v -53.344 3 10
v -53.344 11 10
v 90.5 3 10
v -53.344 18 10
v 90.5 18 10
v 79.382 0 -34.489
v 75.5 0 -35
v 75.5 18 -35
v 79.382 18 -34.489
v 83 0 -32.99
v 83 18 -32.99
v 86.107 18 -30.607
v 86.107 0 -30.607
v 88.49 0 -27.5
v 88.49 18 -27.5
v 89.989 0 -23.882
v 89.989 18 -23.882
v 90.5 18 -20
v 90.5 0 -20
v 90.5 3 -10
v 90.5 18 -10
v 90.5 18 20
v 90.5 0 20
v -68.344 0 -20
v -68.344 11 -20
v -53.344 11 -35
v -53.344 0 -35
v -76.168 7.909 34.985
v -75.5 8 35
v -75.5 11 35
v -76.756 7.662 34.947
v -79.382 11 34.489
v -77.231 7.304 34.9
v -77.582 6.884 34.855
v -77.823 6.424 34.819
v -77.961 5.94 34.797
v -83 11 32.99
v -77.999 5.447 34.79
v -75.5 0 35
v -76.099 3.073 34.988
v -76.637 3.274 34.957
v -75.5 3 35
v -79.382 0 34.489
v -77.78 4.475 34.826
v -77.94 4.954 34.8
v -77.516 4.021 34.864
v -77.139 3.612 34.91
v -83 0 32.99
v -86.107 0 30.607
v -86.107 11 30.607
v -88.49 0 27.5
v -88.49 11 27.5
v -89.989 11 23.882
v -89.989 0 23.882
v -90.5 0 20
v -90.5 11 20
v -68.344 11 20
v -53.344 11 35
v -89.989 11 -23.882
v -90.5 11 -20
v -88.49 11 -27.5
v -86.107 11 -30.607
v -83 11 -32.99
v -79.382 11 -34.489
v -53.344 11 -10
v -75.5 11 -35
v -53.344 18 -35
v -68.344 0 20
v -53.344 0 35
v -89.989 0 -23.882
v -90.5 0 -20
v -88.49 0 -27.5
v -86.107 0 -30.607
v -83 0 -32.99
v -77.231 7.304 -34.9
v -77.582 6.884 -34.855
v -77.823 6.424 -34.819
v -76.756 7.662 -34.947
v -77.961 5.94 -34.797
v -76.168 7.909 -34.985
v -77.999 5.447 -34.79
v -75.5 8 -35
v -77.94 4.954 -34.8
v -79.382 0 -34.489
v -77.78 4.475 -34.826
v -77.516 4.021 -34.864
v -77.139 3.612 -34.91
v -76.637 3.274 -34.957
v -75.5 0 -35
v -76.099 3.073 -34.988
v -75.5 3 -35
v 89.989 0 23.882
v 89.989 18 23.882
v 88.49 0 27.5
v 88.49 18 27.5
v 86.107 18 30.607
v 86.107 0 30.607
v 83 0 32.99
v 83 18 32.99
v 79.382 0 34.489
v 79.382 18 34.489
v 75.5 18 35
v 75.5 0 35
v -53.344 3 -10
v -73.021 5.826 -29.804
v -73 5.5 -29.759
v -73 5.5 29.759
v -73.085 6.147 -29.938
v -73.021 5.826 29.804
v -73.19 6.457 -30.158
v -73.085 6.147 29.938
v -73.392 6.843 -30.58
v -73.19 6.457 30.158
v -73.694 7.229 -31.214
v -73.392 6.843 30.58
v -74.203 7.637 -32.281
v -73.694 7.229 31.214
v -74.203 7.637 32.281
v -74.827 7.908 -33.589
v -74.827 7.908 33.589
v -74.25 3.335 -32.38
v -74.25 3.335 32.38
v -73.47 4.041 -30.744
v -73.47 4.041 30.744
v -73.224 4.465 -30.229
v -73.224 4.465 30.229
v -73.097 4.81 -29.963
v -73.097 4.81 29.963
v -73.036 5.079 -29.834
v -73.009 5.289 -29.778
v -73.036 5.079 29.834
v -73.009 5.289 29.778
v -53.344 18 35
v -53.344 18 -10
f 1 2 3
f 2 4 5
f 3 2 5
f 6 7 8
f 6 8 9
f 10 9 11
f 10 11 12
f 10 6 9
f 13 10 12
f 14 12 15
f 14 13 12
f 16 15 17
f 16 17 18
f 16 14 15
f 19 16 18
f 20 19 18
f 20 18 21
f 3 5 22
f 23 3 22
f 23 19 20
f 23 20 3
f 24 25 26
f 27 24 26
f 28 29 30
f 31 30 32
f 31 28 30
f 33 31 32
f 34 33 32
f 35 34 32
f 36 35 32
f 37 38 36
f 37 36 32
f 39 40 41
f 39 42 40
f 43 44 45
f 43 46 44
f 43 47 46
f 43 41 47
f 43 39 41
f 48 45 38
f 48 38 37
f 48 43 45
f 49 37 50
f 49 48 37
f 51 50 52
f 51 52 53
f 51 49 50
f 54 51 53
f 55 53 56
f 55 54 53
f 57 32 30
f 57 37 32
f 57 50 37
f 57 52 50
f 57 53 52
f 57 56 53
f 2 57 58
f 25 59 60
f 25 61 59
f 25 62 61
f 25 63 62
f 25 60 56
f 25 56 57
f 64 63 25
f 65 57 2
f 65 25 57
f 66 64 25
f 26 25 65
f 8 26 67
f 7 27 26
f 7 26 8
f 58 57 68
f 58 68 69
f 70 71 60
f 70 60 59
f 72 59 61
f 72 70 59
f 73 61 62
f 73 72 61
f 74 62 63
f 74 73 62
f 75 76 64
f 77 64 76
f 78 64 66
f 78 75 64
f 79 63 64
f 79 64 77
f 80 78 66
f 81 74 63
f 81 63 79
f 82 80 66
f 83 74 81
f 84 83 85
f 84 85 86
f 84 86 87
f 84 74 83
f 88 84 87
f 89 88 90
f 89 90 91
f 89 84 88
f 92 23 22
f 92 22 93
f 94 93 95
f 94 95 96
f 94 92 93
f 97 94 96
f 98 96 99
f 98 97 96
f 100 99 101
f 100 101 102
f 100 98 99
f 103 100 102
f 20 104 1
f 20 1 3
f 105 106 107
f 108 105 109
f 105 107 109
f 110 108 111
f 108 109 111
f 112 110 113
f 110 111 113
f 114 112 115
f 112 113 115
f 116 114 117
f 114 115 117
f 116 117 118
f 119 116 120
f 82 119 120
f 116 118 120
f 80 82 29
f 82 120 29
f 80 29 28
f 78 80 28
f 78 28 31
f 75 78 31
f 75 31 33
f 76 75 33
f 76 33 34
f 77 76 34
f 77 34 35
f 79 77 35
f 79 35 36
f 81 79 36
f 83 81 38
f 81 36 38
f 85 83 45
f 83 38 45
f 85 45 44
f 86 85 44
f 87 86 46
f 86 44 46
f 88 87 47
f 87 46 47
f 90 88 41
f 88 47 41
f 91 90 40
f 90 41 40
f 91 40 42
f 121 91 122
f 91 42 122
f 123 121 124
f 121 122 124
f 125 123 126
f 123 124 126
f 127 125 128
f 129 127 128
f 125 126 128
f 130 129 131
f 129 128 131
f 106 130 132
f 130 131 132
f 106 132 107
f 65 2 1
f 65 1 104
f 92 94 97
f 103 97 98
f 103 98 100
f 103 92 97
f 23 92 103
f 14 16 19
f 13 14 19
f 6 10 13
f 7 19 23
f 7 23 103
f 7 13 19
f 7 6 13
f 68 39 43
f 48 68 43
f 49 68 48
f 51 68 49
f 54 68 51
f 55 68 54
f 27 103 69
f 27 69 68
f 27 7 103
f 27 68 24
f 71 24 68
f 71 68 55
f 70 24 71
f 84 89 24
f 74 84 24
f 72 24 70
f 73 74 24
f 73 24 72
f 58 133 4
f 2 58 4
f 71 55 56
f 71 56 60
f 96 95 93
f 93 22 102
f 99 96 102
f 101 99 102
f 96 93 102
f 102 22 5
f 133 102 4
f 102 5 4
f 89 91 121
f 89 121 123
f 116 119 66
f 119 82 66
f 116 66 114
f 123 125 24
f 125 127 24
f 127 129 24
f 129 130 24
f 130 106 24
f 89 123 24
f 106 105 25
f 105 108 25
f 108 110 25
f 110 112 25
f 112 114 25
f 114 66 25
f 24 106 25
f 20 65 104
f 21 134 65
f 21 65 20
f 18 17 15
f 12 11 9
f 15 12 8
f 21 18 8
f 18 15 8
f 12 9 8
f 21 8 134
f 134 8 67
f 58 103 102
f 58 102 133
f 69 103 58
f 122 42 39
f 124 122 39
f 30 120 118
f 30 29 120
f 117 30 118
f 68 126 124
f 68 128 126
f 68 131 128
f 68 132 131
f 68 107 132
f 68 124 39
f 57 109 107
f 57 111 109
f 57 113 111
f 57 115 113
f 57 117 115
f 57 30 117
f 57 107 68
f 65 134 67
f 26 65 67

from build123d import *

# Parameters (mm, degrees)
BOSS_EXTRUDE1_DEPTH = 18
CUT_EXTRUDE1_DEPTH  = 18
CUT_EXTRUDE2_DEPTH  = 18
SKETCH4_W           = 45.12531779
SKETCH4_H           = 70
CUT_EXTRUDE3_DEPTH  = 7
SKETCH5_R           = 2.5
CUT_EXTRUDE4_DEPTH  = 70
SKETCH6_W           = 143.844268465
SKETCH6_H           = 20
CUT_EXTRUDE5_DEPTH  = 15


with BuildPart() as part:
    # Sketch1 → Boss-Extrude1 (new body)
    with BuildSketch(Plane(origin=(0, 0, 0), x_dir=(1, 0, 0), z_dir=(0, 1, 0))):
        with BuildLine():
            Line((-90.5, -20), (-90.5, 20))
            ThreePointArc((-90.5, 20), (-86.106601718, 30.606601718), (-75.5, 35))
            Line((-75.5, 35), (75.5, 35))
            ThreePointArc((75.5, 35), (86.106601718, 30.606601718), (90.5, 20))
            Line((90.5, 20), (90.5, -20))
            ThreePointArc((90.5, -20), (86.106601718, -30.606601718), (75.5, -35))
            Line((75.5, -35), (-75.5, -35))
            ThreePointArc((-75.5, -35), (-86.106601718, -30.606601718), (-90.5, -20))
        make_face()
    extrude(amount=BOSS_EXTRUDE1_DEPTH)

    # Sketch3 → Cut-Extrude1 (cut)
    with BuildSketch(Plane(origin=(0, 18, 0), x_dir=(1, 0, 0), z_dir=(0, 1, 0))):
        Polygon((-75.5, 35), (-68.344268465, 20), (-53.344268465, 35), align=None)
    extrude(amount=-CUT_EXTRUDE1_DEPTH, mode=Mode.SUBTRACT)

    # Sketch3<3> → Cut-Extrude2 (cut)
    with BuildSketch(Plane(origin=(0, 18, 0), x_dir=(1, 0, 0), z_dir=(0, 1, 0))):
        Polygon((-75.5, 35), (-68.344268465, 20), (-53.344268465, 35), align=None)
        Polygon((-75.5, -35), (-68.344268465, -20), (-53.344268465, -35), align=None)
    extrude(amount=-CUT_EXTRUDE2_DEPTH, mode=Mode.SUBTRACT)

    # Sketch4 → Cut-Extrude3 (cut)
    with BuildSketch(Plane(origin=(0, 18, 0), x_dir=(1, 0, 0), z_dir=(0, 1, 0))):
        with Locations((-75.90692736, 0)):
            Rectangle(SKETCH4_W, SKETCH4_H)
    extrude(amount=-CUT_EXTRUDE3_DEPTH, mode=Mode.SUBTRACT)

    # Sketch5 → Cut-Extrude4 (cut)
    with BuildSketch(Plane.XY.offset(35)):
        with Locations((-75.5, 5.5)):
            Circle(SKETCH5_R)
    extrude(amount=-CUT_EXTRUDE4_DEPTH, mode=Mode.SUBTRACT)

    # Sketch6 → Cut-Extrude5 (cut)
    with BuildSketch(Plane(origin=(0, 18, 0), x_dir=(1, 0, 0), z_dir=(0, 1, 0))):
        with Locations((18.577865767, 0)):
            Rectangle(SKETCH6_W, SKETCH6_H)
    extrude(amount=-CUT_EXTRUDE5_DEPTH, mode=Mode.SUBTRACT)


solid = part.part
